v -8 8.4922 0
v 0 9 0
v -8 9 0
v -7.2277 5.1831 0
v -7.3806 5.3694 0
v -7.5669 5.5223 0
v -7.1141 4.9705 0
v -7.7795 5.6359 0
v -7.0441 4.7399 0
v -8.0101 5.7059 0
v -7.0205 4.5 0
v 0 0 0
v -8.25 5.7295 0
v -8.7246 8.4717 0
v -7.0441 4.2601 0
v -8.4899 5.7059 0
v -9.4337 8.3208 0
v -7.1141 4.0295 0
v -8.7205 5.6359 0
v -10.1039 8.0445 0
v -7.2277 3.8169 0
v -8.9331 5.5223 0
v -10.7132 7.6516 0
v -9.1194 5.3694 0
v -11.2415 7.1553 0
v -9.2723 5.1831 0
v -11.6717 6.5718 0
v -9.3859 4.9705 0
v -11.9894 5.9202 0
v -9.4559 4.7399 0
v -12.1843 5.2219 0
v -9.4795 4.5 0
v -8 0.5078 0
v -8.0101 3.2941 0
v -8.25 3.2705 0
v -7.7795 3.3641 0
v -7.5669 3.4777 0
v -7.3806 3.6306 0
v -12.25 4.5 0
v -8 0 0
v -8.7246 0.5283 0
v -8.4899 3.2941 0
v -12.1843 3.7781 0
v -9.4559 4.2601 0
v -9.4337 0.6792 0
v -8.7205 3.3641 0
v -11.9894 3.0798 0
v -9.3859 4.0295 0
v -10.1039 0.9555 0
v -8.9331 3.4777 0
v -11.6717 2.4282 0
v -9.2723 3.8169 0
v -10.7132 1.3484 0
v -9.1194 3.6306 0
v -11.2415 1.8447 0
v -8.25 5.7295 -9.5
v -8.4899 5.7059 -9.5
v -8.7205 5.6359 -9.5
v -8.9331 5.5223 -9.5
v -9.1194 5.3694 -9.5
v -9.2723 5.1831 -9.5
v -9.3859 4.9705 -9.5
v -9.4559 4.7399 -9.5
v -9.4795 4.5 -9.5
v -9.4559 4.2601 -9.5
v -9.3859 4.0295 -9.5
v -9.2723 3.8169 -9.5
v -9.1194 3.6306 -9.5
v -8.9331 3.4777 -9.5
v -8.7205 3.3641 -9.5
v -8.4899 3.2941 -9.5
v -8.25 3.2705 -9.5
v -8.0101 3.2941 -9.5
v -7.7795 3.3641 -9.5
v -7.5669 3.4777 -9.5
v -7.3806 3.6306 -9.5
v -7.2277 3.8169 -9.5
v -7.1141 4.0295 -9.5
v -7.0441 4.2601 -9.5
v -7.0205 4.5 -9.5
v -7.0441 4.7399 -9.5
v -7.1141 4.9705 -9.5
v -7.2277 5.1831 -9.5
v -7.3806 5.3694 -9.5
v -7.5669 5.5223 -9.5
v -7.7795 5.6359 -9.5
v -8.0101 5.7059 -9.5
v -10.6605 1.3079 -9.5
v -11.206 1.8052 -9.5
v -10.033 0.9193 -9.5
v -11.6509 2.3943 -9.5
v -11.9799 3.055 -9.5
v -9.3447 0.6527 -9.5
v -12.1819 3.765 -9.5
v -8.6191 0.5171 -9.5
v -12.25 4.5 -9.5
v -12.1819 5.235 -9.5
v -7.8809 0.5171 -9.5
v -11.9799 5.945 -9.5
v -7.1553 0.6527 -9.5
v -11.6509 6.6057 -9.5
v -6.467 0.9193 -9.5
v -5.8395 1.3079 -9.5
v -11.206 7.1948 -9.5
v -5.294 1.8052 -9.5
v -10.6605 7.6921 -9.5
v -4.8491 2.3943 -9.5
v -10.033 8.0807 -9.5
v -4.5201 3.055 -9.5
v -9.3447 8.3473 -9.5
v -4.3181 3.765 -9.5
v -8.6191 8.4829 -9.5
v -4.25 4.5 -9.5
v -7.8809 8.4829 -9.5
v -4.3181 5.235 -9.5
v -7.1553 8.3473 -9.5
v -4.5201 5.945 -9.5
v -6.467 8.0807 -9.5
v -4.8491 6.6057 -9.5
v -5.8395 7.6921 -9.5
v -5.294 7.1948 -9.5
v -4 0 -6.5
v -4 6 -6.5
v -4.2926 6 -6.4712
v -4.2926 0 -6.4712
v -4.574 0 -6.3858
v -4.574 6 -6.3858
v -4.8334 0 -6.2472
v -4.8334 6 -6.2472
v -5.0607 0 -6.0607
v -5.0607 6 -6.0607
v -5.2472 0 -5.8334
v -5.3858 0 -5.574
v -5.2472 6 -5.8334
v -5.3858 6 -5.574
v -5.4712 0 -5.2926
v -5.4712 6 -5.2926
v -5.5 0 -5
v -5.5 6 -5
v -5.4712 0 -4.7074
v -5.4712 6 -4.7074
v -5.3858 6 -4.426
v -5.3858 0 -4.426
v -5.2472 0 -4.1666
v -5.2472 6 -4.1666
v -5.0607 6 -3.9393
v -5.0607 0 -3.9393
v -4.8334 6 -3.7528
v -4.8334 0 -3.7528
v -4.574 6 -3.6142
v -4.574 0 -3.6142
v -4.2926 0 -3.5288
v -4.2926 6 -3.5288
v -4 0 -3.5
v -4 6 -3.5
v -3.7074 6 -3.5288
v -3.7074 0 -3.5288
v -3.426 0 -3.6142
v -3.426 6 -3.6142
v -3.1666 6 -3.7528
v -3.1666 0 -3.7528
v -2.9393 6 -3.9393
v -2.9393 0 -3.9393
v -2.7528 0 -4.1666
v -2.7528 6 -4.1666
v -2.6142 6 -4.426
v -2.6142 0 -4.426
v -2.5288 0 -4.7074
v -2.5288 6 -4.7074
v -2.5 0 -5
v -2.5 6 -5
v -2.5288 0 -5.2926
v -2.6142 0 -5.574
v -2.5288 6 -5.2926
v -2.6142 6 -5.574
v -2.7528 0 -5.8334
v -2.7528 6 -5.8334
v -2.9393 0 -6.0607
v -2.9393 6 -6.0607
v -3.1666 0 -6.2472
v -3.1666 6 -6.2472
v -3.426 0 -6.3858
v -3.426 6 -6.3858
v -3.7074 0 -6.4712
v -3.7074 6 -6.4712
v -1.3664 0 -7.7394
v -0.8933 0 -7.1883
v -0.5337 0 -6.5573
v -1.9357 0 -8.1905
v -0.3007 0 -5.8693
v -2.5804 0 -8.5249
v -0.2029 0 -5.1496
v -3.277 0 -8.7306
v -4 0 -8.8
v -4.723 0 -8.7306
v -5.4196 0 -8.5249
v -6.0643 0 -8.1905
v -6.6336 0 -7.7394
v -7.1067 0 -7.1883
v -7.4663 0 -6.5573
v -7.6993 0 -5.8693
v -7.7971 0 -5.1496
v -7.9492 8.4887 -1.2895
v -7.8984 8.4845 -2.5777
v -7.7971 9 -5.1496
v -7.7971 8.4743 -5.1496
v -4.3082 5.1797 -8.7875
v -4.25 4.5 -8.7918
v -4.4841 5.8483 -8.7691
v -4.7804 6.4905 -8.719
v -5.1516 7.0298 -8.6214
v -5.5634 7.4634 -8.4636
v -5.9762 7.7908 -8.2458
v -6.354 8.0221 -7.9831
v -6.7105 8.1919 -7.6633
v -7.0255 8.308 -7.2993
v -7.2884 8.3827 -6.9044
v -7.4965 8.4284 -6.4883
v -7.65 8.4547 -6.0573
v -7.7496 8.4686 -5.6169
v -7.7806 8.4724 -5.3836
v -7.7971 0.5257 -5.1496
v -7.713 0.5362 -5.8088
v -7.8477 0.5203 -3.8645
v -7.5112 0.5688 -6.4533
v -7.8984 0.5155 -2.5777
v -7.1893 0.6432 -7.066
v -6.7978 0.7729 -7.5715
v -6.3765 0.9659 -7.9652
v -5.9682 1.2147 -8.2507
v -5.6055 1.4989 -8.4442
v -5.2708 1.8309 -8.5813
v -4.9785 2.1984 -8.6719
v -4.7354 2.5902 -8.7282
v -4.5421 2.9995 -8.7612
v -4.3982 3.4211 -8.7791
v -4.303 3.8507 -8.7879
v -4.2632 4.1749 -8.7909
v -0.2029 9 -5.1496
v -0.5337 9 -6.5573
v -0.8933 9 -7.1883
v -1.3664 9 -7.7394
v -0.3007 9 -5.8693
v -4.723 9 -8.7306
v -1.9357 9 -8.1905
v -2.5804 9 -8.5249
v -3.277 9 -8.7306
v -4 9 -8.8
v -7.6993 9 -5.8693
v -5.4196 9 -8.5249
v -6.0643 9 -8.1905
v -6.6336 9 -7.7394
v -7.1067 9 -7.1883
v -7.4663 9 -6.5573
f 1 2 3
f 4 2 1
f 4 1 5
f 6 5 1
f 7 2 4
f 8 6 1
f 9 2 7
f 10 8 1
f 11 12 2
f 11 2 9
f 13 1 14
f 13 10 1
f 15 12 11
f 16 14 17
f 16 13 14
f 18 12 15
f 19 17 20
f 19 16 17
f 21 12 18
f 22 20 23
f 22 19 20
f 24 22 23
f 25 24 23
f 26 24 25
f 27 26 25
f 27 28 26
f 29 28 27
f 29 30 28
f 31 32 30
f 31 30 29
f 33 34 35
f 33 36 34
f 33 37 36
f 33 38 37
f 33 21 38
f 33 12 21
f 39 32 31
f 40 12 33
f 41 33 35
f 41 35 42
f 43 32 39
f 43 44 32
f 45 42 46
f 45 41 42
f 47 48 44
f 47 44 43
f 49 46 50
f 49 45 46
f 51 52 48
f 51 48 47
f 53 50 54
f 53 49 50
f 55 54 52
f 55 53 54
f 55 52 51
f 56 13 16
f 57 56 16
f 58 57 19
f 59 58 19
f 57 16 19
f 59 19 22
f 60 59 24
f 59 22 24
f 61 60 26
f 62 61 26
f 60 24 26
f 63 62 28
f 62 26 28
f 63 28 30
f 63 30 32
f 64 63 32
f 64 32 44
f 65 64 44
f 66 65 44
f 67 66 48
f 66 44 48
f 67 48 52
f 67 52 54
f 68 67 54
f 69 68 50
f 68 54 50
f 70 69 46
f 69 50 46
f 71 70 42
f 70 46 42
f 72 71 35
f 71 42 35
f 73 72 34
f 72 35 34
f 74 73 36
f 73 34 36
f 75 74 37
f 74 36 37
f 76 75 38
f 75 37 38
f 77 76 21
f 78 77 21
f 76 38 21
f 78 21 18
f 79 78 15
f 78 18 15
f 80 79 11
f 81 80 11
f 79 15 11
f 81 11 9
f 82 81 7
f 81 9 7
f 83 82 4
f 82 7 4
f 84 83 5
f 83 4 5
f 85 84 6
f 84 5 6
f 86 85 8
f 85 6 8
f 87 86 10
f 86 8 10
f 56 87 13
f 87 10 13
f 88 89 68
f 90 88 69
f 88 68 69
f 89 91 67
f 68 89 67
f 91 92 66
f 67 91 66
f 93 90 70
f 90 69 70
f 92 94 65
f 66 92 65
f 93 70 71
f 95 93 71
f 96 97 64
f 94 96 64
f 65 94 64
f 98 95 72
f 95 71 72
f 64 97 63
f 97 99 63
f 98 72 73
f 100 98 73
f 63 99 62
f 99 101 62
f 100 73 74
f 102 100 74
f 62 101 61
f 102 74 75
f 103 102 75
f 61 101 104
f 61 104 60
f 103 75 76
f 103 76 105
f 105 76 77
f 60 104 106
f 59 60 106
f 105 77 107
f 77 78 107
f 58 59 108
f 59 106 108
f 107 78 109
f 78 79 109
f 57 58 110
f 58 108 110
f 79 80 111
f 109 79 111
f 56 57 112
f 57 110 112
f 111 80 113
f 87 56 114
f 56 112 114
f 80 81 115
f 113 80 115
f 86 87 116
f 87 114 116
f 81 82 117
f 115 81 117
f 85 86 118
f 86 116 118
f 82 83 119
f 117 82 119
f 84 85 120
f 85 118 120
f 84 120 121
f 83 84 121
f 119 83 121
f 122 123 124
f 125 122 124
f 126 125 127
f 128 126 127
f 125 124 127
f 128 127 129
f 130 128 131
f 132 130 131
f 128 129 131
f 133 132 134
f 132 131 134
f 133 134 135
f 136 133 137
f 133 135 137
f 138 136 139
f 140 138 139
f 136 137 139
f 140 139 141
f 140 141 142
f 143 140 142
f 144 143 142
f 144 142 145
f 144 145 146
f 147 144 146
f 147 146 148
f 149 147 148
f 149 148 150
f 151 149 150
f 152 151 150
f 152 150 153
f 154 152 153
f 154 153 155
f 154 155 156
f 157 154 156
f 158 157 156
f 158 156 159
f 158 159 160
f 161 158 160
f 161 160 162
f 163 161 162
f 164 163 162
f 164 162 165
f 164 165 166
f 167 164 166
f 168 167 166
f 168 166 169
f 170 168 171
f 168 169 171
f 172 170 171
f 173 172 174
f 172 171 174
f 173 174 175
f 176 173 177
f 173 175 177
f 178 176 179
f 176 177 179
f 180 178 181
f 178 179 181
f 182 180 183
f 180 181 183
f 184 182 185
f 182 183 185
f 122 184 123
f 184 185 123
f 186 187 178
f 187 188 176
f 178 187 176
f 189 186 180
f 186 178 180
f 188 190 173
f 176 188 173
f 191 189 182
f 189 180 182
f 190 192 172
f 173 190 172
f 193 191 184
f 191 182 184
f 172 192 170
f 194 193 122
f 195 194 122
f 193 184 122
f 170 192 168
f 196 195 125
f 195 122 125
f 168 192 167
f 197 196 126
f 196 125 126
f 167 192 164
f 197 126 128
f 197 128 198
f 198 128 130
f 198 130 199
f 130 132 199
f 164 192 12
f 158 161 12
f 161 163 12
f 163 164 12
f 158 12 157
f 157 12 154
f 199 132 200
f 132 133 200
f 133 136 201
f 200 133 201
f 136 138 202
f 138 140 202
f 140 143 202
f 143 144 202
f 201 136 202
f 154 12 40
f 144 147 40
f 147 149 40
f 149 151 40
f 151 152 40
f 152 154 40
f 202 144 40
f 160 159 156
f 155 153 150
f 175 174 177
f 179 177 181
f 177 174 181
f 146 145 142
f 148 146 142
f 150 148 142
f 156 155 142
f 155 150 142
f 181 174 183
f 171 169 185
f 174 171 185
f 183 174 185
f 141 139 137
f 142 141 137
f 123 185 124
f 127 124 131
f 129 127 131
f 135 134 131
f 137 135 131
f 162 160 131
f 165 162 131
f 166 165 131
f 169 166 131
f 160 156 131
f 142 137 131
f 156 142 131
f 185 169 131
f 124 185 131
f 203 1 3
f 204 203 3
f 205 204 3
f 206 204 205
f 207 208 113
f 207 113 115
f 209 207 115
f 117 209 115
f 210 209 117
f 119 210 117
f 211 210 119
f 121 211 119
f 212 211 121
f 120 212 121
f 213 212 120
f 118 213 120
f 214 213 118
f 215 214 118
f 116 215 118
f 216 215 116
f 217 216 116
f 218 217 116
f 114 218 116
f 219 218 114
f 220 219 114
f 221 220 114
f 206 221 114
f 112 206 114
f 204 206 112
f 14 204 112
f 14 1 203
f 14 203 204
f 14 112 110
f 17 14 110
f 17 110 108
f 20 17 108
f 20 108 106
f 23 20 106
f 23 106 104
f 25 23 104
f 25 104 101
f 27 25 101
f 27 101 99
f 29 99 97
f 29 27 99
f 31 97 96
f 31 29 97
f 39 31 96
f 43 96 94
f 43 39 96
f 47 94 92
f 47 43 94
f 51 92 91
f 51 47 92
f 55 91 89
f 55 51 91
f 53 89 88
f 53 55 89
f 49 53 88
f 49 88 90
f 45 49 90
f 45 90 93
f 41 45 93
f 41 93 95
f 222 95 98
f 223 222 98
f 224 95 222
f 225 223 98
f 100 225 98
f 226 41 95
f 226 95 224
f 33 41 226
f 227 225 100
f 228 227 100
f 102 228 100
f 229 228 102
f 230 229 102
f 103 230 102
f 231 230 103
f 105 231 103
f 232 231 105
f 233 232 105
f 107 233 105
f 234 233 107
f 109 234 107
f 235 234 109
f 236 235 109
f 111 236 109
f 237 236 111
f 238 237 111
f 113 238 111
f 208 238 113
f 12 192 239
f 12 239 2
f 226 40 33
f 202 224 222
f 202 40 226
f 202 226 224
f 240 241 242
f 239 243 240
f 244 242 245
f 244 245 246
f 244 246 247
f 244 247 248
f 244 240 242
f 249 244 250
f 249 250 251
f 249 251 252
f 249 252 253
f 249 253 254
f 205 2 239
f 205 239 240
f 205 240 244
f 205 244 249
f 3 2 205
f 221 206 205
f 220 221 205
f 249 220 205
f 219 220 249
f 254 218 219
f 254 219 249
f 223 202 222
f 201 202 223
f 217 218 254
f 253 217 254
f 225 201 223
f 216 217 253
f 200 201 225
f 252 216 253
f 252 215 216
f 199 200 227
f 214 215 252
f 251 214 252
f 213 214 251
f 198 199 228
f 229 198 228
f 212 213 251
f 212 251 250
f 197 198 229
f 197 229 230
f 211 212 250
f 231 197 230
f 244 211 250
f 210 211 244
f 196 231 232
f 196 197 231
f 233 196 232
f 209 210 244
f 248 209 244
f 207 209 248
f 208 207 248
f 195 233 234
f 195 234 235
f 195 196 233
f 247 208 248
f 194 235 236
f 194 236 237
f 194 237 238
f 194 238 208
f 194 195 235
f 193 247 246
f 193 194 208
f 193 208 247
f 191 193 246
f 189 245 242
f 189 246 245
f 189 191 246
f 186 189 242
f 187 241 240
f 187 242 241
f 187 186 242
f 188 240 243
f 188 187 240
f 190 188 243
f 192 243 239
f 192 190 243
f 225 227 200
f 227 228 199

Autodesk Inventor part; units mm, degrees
ref_plane "YZ Plane" through (0, 0, 0) normal (1, 0, 0) x (0, 1, 0)
ref_plane "XZ Plane" through (0, 0, 0) normal (0, 1, 0) x (-1, 0, 0)
ref_plane "XY Plane" through (0, 0, 0) normal (0, 0, 1) x (1, 0, 0)
sketch "Sketch1" plane through (0, 0, 0) normal (0, 1, 0) x (-1, 0, 0)
  line L0 (0, 0) -> (8, 0)
  line L1 (8, 0) -> (7.7971, -5.1496)
  line L2 (0.2029, -5.1496) -> (0, 0)
  arc A0 (0.2029, -5.1496) -> (7.7971, -5.1496) centre (4, -5) ccw
  line L3 (4, -5) -> (4, -1.2)
  dimension "d0" = 3.8
  dimension "d1" = 5
  dimension "d2" = 8
extrude "Extrusion1" add sketch "Sketch1" along normal blind 9
sketch "Sketch2" plane through (-8, 0, 0) normal (0, 0, 1) x (1, 0, 0)
  line L0 (8, 0) -> (0, 0) projected
  line L1 (0, 0) -> (0, 9) projected
  circle A0 centre (-0.25, 4.5) radius 4
  line L2 (4, 0) -> (4, -1.6223)
  point P0 (0, 4.5)
  dimension "d5" = 8
  dimension "d6" = 4.25
extrude "Extrusion2" add sketch "Sketch2" against normal blind 9.5
hole "Hole2" at (-8.25, 4.5, -9.5) direction (0, 0, 1) diameter 2.459 depth 12.05 thread size "M3x0.5" class "6H" standard "ISO Metric profile"
hole "Hole3" at (-4, 0, -5) direction (0, 1, 0) diameter 3 depth 6
properties part number "500-172" material "ABS Plastic"
